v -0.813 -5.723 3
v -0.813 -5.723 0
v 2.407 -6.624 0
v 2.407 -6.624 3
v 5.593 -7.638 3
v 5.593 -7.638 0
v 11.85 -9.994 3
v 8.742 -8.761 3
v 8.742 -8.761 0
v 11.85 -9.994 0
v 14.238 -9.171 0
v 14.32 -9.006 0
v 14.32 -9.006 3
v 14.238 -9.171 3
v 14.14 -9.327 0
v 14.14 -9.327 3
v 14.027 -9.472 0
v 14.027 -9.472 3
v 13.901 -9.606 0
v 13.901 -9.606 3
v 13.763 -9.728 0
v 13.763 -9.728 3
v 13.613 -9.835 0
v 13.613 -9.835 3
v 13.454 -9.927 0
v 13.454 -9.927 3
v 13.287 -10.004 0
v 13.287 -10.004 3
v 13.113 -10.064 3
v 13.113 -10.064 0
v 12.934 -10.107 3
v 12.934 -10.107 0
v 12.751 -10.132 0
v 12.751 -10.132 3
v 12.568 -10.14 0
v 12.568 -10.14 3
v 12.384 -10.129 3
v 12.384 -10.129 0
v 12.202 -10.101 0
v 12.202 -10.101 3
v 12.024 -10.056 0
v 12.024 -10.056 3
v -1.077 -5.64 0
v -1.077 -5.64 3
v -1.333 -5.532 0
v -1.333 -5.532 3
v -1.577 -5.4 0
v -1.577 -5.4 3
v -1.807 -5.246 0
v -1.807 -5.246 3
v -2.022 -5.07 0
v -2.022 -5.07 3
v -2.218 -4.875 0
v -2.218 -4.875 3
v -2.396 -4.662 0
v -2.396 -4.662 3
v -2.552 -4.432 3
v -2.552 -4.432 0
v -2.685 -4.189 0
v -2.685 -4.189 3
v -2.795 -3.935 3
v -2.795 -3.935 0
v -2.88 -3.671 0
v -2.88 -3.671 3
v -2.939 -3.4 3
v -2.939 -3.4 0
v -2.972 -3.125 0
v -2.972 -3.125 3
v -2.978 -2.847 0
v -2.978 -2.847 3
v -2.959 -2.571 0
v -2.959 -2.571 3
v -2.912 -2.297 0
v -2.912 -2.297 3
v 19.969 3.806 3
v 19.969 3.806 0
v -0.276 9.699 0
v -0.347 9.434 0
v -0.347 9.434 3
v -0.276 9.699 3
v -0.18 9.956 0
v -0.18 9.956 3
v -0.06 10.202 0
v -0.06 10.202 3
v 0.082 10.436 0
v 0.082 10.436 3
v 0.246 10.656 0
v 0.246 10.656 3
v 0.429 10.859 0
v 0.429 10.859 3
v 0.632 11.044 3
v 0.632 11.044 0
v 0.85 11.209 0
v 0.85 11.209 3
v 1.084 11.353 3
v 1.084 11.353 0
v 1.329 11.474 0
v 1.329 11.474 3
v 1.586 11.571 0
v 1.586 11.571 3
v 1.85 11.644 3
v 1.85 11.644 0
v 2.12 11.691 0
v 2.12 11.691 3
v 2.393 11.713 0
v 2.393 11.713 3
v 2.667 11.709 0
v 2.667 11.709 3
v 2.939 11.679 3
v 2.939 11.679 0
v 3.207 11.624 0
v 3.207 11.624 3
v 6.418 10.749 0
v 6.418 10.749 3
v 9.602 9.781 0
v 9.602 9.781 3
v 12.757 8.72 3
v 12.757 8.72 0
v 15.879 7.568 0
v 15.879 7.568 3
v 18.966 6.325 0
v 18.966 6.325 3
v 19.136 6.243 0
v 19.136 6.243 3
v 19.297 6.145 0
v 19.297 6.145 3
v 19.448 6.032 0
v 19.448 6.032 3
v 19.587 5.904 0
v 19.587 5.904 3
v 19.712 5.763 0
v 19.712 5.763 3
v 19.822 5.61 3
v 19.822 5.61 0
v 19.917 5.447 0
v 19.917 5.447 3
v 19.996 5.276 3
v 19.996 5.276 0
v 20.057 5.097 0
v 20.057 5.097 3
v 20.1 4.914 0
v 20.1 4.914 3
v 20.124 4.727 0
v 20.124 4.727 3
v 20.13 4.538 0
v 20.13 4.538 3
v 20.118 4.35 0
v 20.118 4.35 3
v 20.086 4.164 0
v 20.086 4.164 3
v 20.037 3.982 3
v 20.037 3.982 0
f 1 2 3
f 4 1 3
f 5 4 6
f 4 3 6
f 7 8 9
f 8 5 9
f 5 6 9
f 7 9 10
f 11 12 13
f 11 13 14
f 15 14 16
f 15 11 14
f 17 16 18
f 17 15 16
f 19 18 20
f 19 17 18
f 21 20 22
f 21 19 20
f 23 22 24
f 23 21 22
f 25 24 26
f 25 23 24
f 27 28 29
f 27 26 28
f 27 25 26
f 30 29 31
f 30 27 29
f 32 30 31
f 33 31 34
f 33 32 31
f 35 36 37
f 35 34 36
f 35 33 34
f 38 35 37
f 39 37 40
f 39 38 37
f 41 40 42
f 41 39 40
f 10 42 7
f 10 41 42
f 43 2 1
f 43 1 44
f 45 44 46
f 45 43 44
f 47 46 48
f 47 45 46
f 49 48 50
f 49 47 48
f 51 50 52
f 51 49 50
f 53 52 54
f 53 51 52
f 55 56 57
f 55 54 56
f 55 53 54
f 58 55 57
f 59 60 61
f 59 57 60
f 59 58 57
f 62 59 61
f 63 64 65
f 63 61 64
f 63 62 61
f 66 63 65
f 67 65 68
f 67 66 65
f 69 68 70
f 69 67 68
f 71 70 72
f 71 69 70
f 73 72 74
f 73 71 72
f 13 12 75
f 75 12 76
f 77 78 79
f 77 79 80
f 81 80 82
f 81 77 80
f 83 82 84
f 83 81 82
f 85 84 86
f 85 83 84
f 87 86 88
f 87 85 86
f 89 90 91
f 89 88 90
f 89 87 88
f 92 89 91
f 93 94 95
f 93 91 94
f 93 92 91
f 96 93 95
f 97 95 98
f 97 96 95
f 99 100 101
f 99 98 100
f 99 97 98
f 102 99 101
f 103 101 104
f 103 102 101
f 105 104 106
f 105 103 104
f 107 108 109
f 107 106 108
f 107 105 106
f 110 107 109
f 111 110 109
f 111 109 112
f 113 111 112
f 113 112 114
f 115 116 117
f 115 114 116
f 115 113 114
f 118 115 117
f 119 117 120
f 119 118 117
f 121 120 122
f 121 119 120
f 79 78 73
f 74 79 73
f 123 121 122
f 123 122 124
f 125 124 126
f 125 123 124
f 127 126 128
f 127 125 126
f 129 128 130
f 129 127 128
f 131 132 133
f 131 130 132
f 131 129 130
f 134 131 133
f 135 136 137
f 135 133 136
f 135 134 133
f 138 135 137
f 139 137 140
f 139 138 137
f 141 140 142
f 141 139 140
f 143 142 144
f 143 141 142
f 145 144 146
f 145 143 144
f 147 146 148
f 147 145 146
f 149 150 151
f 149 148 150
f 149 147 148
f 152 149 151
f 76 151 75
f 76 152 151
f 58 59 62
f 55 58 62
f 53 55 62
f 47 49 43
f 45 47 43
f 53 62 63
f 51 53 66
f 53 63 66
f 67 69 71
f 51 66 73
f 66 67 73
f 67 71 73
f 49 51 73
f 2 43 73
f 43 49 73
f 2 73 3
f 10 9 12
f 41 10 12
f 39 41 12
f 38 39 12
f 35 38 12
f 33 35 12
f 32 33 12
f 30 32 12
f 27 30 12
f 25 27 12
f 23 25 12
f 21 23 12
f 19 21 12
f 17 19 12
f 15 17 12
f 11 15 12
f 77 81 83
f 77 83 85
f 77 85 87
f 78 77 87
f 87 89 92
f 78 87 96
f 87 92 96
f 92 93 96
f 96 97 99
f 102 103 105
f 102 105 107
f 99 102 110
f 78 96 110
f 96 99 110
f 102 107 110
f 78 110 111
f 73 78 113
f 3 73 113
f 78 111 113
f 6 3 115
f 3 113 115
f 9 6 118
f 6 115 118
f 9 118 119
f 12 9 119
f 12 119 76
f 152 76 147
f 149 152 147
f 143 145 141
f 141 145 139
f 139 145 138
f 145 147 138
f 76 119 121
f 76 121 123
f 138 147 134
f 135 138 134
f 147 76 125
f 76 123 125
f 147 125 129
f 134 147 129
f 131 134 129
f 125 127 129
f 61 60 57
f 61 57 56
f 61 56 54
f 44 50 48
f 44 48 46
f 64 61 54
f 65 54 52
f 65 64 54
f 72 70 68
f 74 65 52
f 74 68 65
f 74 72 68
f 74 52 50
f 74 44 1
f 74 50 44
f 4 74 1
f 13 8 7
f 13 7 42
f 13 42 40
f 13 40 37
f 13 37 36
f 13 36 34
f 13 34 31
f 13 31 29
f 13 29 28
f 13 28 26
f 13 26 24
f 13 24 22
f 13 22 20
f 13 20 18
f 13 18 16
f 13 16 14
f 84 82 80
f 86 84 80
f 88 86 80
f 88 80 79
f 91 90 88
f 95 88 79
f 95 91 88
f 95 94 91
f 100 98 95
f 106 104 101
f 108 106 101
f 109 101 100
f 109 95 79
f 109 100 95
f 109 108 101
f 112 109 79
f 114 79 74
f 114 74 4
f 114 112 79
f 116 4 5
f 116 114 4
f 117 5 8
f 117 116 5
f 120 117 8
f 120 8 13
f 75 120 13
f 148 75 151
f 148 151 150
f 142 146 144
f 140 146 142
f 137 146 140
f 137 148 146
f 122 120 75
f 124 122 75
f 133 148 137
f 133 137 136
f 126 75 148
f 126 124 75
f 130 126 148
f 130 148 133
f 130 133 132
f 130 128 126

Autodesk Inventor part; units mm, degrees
ref_plane "YZ Plane" through (0, 0, 0) normal (1, 0, 0) x (0, 1, 0)
ref_plane "XZ Plane" through (0, 0, 0) normal (0, 1, 0) x (-1, 0, 0)
ref_plane "XY Plane" through (0, 0, 0) normal (0, 0, 1) x (1, 0, 0)
sketch "草图2" plane through (0, 0, 0) normal (0, 0, 1) x (1, 0, 0)
  arc A0 (11.812, -10.0858) -> (14.4114, -9.0466) centre (12.5814, -8.2397) ccw projected
  arc A1 (11.812, -10.0858) -> (-0.838, -5.8193) centre (-25.1186, -98.698) ccw projected
  arc A2 (-3.01, -2.276) -> (-0.838, -5.8193) centre (-0.0792, -2.9169) ccw projected
  line L0 (-0.4446, 9.4555) -> (-3.01, -2.276) projected
  arc A3 (3.2323, 11.7204) -> (-0.4446, 9.4555) centre (2.4862, 8.8147) ccw projected
  arc A4 (19.0048, 6.4168) -> (3.2323, 11.7204) centre (-25.1186, -98.698) ccw projected
  arc A5 (20.0607, 3.7658) -> (19.0048, 6.4168) centre (18.2307, 4.5727) ccw projected
  line L1 (14.4114, -9.0466) -> (20.0607, 3.7658) projected
  arc A6 (19.9692, 3.8061) -> (18.9661, 6.3246) centre (18.2307, 4.5727) ccw
  arc A7 (18.9661, 6.3246) -> (3.2074, 11.6235) centre (-25.1186, -98.698) ccw
  arc A8 (3.2074, 11.6235) -> (-0.3469, 9.4342) centre (2.4862, 8.8147) ccw
  line L2 (-0.3469, 9.4342) -> (-2.9123, -2.2974)
  arc A9 (-2.9123, -2.2974) -> (-0.8127, -5.7226) centre (-0.0792, -2.9169) ccw
  arc A10 (11.8505, -9.9935) -> (-0.8127, -5.7226) centre (-25.1186, -98.698) ccw
  arc A11 (11.8505, -9.9935) -> (14.3199, -9.0062) centre (12.5814, -8.2397) ccw
  line L3 (14.3199, -9.0062) -> (19.9692, 3.8061)
  dimension "d2" = 0.1
extrude "拉伸1" add sketch "草图2" along normal blind 3 contours L3 A11 A10 A9 L2 A8 A7 A6
properties part number "斜板固定件"
